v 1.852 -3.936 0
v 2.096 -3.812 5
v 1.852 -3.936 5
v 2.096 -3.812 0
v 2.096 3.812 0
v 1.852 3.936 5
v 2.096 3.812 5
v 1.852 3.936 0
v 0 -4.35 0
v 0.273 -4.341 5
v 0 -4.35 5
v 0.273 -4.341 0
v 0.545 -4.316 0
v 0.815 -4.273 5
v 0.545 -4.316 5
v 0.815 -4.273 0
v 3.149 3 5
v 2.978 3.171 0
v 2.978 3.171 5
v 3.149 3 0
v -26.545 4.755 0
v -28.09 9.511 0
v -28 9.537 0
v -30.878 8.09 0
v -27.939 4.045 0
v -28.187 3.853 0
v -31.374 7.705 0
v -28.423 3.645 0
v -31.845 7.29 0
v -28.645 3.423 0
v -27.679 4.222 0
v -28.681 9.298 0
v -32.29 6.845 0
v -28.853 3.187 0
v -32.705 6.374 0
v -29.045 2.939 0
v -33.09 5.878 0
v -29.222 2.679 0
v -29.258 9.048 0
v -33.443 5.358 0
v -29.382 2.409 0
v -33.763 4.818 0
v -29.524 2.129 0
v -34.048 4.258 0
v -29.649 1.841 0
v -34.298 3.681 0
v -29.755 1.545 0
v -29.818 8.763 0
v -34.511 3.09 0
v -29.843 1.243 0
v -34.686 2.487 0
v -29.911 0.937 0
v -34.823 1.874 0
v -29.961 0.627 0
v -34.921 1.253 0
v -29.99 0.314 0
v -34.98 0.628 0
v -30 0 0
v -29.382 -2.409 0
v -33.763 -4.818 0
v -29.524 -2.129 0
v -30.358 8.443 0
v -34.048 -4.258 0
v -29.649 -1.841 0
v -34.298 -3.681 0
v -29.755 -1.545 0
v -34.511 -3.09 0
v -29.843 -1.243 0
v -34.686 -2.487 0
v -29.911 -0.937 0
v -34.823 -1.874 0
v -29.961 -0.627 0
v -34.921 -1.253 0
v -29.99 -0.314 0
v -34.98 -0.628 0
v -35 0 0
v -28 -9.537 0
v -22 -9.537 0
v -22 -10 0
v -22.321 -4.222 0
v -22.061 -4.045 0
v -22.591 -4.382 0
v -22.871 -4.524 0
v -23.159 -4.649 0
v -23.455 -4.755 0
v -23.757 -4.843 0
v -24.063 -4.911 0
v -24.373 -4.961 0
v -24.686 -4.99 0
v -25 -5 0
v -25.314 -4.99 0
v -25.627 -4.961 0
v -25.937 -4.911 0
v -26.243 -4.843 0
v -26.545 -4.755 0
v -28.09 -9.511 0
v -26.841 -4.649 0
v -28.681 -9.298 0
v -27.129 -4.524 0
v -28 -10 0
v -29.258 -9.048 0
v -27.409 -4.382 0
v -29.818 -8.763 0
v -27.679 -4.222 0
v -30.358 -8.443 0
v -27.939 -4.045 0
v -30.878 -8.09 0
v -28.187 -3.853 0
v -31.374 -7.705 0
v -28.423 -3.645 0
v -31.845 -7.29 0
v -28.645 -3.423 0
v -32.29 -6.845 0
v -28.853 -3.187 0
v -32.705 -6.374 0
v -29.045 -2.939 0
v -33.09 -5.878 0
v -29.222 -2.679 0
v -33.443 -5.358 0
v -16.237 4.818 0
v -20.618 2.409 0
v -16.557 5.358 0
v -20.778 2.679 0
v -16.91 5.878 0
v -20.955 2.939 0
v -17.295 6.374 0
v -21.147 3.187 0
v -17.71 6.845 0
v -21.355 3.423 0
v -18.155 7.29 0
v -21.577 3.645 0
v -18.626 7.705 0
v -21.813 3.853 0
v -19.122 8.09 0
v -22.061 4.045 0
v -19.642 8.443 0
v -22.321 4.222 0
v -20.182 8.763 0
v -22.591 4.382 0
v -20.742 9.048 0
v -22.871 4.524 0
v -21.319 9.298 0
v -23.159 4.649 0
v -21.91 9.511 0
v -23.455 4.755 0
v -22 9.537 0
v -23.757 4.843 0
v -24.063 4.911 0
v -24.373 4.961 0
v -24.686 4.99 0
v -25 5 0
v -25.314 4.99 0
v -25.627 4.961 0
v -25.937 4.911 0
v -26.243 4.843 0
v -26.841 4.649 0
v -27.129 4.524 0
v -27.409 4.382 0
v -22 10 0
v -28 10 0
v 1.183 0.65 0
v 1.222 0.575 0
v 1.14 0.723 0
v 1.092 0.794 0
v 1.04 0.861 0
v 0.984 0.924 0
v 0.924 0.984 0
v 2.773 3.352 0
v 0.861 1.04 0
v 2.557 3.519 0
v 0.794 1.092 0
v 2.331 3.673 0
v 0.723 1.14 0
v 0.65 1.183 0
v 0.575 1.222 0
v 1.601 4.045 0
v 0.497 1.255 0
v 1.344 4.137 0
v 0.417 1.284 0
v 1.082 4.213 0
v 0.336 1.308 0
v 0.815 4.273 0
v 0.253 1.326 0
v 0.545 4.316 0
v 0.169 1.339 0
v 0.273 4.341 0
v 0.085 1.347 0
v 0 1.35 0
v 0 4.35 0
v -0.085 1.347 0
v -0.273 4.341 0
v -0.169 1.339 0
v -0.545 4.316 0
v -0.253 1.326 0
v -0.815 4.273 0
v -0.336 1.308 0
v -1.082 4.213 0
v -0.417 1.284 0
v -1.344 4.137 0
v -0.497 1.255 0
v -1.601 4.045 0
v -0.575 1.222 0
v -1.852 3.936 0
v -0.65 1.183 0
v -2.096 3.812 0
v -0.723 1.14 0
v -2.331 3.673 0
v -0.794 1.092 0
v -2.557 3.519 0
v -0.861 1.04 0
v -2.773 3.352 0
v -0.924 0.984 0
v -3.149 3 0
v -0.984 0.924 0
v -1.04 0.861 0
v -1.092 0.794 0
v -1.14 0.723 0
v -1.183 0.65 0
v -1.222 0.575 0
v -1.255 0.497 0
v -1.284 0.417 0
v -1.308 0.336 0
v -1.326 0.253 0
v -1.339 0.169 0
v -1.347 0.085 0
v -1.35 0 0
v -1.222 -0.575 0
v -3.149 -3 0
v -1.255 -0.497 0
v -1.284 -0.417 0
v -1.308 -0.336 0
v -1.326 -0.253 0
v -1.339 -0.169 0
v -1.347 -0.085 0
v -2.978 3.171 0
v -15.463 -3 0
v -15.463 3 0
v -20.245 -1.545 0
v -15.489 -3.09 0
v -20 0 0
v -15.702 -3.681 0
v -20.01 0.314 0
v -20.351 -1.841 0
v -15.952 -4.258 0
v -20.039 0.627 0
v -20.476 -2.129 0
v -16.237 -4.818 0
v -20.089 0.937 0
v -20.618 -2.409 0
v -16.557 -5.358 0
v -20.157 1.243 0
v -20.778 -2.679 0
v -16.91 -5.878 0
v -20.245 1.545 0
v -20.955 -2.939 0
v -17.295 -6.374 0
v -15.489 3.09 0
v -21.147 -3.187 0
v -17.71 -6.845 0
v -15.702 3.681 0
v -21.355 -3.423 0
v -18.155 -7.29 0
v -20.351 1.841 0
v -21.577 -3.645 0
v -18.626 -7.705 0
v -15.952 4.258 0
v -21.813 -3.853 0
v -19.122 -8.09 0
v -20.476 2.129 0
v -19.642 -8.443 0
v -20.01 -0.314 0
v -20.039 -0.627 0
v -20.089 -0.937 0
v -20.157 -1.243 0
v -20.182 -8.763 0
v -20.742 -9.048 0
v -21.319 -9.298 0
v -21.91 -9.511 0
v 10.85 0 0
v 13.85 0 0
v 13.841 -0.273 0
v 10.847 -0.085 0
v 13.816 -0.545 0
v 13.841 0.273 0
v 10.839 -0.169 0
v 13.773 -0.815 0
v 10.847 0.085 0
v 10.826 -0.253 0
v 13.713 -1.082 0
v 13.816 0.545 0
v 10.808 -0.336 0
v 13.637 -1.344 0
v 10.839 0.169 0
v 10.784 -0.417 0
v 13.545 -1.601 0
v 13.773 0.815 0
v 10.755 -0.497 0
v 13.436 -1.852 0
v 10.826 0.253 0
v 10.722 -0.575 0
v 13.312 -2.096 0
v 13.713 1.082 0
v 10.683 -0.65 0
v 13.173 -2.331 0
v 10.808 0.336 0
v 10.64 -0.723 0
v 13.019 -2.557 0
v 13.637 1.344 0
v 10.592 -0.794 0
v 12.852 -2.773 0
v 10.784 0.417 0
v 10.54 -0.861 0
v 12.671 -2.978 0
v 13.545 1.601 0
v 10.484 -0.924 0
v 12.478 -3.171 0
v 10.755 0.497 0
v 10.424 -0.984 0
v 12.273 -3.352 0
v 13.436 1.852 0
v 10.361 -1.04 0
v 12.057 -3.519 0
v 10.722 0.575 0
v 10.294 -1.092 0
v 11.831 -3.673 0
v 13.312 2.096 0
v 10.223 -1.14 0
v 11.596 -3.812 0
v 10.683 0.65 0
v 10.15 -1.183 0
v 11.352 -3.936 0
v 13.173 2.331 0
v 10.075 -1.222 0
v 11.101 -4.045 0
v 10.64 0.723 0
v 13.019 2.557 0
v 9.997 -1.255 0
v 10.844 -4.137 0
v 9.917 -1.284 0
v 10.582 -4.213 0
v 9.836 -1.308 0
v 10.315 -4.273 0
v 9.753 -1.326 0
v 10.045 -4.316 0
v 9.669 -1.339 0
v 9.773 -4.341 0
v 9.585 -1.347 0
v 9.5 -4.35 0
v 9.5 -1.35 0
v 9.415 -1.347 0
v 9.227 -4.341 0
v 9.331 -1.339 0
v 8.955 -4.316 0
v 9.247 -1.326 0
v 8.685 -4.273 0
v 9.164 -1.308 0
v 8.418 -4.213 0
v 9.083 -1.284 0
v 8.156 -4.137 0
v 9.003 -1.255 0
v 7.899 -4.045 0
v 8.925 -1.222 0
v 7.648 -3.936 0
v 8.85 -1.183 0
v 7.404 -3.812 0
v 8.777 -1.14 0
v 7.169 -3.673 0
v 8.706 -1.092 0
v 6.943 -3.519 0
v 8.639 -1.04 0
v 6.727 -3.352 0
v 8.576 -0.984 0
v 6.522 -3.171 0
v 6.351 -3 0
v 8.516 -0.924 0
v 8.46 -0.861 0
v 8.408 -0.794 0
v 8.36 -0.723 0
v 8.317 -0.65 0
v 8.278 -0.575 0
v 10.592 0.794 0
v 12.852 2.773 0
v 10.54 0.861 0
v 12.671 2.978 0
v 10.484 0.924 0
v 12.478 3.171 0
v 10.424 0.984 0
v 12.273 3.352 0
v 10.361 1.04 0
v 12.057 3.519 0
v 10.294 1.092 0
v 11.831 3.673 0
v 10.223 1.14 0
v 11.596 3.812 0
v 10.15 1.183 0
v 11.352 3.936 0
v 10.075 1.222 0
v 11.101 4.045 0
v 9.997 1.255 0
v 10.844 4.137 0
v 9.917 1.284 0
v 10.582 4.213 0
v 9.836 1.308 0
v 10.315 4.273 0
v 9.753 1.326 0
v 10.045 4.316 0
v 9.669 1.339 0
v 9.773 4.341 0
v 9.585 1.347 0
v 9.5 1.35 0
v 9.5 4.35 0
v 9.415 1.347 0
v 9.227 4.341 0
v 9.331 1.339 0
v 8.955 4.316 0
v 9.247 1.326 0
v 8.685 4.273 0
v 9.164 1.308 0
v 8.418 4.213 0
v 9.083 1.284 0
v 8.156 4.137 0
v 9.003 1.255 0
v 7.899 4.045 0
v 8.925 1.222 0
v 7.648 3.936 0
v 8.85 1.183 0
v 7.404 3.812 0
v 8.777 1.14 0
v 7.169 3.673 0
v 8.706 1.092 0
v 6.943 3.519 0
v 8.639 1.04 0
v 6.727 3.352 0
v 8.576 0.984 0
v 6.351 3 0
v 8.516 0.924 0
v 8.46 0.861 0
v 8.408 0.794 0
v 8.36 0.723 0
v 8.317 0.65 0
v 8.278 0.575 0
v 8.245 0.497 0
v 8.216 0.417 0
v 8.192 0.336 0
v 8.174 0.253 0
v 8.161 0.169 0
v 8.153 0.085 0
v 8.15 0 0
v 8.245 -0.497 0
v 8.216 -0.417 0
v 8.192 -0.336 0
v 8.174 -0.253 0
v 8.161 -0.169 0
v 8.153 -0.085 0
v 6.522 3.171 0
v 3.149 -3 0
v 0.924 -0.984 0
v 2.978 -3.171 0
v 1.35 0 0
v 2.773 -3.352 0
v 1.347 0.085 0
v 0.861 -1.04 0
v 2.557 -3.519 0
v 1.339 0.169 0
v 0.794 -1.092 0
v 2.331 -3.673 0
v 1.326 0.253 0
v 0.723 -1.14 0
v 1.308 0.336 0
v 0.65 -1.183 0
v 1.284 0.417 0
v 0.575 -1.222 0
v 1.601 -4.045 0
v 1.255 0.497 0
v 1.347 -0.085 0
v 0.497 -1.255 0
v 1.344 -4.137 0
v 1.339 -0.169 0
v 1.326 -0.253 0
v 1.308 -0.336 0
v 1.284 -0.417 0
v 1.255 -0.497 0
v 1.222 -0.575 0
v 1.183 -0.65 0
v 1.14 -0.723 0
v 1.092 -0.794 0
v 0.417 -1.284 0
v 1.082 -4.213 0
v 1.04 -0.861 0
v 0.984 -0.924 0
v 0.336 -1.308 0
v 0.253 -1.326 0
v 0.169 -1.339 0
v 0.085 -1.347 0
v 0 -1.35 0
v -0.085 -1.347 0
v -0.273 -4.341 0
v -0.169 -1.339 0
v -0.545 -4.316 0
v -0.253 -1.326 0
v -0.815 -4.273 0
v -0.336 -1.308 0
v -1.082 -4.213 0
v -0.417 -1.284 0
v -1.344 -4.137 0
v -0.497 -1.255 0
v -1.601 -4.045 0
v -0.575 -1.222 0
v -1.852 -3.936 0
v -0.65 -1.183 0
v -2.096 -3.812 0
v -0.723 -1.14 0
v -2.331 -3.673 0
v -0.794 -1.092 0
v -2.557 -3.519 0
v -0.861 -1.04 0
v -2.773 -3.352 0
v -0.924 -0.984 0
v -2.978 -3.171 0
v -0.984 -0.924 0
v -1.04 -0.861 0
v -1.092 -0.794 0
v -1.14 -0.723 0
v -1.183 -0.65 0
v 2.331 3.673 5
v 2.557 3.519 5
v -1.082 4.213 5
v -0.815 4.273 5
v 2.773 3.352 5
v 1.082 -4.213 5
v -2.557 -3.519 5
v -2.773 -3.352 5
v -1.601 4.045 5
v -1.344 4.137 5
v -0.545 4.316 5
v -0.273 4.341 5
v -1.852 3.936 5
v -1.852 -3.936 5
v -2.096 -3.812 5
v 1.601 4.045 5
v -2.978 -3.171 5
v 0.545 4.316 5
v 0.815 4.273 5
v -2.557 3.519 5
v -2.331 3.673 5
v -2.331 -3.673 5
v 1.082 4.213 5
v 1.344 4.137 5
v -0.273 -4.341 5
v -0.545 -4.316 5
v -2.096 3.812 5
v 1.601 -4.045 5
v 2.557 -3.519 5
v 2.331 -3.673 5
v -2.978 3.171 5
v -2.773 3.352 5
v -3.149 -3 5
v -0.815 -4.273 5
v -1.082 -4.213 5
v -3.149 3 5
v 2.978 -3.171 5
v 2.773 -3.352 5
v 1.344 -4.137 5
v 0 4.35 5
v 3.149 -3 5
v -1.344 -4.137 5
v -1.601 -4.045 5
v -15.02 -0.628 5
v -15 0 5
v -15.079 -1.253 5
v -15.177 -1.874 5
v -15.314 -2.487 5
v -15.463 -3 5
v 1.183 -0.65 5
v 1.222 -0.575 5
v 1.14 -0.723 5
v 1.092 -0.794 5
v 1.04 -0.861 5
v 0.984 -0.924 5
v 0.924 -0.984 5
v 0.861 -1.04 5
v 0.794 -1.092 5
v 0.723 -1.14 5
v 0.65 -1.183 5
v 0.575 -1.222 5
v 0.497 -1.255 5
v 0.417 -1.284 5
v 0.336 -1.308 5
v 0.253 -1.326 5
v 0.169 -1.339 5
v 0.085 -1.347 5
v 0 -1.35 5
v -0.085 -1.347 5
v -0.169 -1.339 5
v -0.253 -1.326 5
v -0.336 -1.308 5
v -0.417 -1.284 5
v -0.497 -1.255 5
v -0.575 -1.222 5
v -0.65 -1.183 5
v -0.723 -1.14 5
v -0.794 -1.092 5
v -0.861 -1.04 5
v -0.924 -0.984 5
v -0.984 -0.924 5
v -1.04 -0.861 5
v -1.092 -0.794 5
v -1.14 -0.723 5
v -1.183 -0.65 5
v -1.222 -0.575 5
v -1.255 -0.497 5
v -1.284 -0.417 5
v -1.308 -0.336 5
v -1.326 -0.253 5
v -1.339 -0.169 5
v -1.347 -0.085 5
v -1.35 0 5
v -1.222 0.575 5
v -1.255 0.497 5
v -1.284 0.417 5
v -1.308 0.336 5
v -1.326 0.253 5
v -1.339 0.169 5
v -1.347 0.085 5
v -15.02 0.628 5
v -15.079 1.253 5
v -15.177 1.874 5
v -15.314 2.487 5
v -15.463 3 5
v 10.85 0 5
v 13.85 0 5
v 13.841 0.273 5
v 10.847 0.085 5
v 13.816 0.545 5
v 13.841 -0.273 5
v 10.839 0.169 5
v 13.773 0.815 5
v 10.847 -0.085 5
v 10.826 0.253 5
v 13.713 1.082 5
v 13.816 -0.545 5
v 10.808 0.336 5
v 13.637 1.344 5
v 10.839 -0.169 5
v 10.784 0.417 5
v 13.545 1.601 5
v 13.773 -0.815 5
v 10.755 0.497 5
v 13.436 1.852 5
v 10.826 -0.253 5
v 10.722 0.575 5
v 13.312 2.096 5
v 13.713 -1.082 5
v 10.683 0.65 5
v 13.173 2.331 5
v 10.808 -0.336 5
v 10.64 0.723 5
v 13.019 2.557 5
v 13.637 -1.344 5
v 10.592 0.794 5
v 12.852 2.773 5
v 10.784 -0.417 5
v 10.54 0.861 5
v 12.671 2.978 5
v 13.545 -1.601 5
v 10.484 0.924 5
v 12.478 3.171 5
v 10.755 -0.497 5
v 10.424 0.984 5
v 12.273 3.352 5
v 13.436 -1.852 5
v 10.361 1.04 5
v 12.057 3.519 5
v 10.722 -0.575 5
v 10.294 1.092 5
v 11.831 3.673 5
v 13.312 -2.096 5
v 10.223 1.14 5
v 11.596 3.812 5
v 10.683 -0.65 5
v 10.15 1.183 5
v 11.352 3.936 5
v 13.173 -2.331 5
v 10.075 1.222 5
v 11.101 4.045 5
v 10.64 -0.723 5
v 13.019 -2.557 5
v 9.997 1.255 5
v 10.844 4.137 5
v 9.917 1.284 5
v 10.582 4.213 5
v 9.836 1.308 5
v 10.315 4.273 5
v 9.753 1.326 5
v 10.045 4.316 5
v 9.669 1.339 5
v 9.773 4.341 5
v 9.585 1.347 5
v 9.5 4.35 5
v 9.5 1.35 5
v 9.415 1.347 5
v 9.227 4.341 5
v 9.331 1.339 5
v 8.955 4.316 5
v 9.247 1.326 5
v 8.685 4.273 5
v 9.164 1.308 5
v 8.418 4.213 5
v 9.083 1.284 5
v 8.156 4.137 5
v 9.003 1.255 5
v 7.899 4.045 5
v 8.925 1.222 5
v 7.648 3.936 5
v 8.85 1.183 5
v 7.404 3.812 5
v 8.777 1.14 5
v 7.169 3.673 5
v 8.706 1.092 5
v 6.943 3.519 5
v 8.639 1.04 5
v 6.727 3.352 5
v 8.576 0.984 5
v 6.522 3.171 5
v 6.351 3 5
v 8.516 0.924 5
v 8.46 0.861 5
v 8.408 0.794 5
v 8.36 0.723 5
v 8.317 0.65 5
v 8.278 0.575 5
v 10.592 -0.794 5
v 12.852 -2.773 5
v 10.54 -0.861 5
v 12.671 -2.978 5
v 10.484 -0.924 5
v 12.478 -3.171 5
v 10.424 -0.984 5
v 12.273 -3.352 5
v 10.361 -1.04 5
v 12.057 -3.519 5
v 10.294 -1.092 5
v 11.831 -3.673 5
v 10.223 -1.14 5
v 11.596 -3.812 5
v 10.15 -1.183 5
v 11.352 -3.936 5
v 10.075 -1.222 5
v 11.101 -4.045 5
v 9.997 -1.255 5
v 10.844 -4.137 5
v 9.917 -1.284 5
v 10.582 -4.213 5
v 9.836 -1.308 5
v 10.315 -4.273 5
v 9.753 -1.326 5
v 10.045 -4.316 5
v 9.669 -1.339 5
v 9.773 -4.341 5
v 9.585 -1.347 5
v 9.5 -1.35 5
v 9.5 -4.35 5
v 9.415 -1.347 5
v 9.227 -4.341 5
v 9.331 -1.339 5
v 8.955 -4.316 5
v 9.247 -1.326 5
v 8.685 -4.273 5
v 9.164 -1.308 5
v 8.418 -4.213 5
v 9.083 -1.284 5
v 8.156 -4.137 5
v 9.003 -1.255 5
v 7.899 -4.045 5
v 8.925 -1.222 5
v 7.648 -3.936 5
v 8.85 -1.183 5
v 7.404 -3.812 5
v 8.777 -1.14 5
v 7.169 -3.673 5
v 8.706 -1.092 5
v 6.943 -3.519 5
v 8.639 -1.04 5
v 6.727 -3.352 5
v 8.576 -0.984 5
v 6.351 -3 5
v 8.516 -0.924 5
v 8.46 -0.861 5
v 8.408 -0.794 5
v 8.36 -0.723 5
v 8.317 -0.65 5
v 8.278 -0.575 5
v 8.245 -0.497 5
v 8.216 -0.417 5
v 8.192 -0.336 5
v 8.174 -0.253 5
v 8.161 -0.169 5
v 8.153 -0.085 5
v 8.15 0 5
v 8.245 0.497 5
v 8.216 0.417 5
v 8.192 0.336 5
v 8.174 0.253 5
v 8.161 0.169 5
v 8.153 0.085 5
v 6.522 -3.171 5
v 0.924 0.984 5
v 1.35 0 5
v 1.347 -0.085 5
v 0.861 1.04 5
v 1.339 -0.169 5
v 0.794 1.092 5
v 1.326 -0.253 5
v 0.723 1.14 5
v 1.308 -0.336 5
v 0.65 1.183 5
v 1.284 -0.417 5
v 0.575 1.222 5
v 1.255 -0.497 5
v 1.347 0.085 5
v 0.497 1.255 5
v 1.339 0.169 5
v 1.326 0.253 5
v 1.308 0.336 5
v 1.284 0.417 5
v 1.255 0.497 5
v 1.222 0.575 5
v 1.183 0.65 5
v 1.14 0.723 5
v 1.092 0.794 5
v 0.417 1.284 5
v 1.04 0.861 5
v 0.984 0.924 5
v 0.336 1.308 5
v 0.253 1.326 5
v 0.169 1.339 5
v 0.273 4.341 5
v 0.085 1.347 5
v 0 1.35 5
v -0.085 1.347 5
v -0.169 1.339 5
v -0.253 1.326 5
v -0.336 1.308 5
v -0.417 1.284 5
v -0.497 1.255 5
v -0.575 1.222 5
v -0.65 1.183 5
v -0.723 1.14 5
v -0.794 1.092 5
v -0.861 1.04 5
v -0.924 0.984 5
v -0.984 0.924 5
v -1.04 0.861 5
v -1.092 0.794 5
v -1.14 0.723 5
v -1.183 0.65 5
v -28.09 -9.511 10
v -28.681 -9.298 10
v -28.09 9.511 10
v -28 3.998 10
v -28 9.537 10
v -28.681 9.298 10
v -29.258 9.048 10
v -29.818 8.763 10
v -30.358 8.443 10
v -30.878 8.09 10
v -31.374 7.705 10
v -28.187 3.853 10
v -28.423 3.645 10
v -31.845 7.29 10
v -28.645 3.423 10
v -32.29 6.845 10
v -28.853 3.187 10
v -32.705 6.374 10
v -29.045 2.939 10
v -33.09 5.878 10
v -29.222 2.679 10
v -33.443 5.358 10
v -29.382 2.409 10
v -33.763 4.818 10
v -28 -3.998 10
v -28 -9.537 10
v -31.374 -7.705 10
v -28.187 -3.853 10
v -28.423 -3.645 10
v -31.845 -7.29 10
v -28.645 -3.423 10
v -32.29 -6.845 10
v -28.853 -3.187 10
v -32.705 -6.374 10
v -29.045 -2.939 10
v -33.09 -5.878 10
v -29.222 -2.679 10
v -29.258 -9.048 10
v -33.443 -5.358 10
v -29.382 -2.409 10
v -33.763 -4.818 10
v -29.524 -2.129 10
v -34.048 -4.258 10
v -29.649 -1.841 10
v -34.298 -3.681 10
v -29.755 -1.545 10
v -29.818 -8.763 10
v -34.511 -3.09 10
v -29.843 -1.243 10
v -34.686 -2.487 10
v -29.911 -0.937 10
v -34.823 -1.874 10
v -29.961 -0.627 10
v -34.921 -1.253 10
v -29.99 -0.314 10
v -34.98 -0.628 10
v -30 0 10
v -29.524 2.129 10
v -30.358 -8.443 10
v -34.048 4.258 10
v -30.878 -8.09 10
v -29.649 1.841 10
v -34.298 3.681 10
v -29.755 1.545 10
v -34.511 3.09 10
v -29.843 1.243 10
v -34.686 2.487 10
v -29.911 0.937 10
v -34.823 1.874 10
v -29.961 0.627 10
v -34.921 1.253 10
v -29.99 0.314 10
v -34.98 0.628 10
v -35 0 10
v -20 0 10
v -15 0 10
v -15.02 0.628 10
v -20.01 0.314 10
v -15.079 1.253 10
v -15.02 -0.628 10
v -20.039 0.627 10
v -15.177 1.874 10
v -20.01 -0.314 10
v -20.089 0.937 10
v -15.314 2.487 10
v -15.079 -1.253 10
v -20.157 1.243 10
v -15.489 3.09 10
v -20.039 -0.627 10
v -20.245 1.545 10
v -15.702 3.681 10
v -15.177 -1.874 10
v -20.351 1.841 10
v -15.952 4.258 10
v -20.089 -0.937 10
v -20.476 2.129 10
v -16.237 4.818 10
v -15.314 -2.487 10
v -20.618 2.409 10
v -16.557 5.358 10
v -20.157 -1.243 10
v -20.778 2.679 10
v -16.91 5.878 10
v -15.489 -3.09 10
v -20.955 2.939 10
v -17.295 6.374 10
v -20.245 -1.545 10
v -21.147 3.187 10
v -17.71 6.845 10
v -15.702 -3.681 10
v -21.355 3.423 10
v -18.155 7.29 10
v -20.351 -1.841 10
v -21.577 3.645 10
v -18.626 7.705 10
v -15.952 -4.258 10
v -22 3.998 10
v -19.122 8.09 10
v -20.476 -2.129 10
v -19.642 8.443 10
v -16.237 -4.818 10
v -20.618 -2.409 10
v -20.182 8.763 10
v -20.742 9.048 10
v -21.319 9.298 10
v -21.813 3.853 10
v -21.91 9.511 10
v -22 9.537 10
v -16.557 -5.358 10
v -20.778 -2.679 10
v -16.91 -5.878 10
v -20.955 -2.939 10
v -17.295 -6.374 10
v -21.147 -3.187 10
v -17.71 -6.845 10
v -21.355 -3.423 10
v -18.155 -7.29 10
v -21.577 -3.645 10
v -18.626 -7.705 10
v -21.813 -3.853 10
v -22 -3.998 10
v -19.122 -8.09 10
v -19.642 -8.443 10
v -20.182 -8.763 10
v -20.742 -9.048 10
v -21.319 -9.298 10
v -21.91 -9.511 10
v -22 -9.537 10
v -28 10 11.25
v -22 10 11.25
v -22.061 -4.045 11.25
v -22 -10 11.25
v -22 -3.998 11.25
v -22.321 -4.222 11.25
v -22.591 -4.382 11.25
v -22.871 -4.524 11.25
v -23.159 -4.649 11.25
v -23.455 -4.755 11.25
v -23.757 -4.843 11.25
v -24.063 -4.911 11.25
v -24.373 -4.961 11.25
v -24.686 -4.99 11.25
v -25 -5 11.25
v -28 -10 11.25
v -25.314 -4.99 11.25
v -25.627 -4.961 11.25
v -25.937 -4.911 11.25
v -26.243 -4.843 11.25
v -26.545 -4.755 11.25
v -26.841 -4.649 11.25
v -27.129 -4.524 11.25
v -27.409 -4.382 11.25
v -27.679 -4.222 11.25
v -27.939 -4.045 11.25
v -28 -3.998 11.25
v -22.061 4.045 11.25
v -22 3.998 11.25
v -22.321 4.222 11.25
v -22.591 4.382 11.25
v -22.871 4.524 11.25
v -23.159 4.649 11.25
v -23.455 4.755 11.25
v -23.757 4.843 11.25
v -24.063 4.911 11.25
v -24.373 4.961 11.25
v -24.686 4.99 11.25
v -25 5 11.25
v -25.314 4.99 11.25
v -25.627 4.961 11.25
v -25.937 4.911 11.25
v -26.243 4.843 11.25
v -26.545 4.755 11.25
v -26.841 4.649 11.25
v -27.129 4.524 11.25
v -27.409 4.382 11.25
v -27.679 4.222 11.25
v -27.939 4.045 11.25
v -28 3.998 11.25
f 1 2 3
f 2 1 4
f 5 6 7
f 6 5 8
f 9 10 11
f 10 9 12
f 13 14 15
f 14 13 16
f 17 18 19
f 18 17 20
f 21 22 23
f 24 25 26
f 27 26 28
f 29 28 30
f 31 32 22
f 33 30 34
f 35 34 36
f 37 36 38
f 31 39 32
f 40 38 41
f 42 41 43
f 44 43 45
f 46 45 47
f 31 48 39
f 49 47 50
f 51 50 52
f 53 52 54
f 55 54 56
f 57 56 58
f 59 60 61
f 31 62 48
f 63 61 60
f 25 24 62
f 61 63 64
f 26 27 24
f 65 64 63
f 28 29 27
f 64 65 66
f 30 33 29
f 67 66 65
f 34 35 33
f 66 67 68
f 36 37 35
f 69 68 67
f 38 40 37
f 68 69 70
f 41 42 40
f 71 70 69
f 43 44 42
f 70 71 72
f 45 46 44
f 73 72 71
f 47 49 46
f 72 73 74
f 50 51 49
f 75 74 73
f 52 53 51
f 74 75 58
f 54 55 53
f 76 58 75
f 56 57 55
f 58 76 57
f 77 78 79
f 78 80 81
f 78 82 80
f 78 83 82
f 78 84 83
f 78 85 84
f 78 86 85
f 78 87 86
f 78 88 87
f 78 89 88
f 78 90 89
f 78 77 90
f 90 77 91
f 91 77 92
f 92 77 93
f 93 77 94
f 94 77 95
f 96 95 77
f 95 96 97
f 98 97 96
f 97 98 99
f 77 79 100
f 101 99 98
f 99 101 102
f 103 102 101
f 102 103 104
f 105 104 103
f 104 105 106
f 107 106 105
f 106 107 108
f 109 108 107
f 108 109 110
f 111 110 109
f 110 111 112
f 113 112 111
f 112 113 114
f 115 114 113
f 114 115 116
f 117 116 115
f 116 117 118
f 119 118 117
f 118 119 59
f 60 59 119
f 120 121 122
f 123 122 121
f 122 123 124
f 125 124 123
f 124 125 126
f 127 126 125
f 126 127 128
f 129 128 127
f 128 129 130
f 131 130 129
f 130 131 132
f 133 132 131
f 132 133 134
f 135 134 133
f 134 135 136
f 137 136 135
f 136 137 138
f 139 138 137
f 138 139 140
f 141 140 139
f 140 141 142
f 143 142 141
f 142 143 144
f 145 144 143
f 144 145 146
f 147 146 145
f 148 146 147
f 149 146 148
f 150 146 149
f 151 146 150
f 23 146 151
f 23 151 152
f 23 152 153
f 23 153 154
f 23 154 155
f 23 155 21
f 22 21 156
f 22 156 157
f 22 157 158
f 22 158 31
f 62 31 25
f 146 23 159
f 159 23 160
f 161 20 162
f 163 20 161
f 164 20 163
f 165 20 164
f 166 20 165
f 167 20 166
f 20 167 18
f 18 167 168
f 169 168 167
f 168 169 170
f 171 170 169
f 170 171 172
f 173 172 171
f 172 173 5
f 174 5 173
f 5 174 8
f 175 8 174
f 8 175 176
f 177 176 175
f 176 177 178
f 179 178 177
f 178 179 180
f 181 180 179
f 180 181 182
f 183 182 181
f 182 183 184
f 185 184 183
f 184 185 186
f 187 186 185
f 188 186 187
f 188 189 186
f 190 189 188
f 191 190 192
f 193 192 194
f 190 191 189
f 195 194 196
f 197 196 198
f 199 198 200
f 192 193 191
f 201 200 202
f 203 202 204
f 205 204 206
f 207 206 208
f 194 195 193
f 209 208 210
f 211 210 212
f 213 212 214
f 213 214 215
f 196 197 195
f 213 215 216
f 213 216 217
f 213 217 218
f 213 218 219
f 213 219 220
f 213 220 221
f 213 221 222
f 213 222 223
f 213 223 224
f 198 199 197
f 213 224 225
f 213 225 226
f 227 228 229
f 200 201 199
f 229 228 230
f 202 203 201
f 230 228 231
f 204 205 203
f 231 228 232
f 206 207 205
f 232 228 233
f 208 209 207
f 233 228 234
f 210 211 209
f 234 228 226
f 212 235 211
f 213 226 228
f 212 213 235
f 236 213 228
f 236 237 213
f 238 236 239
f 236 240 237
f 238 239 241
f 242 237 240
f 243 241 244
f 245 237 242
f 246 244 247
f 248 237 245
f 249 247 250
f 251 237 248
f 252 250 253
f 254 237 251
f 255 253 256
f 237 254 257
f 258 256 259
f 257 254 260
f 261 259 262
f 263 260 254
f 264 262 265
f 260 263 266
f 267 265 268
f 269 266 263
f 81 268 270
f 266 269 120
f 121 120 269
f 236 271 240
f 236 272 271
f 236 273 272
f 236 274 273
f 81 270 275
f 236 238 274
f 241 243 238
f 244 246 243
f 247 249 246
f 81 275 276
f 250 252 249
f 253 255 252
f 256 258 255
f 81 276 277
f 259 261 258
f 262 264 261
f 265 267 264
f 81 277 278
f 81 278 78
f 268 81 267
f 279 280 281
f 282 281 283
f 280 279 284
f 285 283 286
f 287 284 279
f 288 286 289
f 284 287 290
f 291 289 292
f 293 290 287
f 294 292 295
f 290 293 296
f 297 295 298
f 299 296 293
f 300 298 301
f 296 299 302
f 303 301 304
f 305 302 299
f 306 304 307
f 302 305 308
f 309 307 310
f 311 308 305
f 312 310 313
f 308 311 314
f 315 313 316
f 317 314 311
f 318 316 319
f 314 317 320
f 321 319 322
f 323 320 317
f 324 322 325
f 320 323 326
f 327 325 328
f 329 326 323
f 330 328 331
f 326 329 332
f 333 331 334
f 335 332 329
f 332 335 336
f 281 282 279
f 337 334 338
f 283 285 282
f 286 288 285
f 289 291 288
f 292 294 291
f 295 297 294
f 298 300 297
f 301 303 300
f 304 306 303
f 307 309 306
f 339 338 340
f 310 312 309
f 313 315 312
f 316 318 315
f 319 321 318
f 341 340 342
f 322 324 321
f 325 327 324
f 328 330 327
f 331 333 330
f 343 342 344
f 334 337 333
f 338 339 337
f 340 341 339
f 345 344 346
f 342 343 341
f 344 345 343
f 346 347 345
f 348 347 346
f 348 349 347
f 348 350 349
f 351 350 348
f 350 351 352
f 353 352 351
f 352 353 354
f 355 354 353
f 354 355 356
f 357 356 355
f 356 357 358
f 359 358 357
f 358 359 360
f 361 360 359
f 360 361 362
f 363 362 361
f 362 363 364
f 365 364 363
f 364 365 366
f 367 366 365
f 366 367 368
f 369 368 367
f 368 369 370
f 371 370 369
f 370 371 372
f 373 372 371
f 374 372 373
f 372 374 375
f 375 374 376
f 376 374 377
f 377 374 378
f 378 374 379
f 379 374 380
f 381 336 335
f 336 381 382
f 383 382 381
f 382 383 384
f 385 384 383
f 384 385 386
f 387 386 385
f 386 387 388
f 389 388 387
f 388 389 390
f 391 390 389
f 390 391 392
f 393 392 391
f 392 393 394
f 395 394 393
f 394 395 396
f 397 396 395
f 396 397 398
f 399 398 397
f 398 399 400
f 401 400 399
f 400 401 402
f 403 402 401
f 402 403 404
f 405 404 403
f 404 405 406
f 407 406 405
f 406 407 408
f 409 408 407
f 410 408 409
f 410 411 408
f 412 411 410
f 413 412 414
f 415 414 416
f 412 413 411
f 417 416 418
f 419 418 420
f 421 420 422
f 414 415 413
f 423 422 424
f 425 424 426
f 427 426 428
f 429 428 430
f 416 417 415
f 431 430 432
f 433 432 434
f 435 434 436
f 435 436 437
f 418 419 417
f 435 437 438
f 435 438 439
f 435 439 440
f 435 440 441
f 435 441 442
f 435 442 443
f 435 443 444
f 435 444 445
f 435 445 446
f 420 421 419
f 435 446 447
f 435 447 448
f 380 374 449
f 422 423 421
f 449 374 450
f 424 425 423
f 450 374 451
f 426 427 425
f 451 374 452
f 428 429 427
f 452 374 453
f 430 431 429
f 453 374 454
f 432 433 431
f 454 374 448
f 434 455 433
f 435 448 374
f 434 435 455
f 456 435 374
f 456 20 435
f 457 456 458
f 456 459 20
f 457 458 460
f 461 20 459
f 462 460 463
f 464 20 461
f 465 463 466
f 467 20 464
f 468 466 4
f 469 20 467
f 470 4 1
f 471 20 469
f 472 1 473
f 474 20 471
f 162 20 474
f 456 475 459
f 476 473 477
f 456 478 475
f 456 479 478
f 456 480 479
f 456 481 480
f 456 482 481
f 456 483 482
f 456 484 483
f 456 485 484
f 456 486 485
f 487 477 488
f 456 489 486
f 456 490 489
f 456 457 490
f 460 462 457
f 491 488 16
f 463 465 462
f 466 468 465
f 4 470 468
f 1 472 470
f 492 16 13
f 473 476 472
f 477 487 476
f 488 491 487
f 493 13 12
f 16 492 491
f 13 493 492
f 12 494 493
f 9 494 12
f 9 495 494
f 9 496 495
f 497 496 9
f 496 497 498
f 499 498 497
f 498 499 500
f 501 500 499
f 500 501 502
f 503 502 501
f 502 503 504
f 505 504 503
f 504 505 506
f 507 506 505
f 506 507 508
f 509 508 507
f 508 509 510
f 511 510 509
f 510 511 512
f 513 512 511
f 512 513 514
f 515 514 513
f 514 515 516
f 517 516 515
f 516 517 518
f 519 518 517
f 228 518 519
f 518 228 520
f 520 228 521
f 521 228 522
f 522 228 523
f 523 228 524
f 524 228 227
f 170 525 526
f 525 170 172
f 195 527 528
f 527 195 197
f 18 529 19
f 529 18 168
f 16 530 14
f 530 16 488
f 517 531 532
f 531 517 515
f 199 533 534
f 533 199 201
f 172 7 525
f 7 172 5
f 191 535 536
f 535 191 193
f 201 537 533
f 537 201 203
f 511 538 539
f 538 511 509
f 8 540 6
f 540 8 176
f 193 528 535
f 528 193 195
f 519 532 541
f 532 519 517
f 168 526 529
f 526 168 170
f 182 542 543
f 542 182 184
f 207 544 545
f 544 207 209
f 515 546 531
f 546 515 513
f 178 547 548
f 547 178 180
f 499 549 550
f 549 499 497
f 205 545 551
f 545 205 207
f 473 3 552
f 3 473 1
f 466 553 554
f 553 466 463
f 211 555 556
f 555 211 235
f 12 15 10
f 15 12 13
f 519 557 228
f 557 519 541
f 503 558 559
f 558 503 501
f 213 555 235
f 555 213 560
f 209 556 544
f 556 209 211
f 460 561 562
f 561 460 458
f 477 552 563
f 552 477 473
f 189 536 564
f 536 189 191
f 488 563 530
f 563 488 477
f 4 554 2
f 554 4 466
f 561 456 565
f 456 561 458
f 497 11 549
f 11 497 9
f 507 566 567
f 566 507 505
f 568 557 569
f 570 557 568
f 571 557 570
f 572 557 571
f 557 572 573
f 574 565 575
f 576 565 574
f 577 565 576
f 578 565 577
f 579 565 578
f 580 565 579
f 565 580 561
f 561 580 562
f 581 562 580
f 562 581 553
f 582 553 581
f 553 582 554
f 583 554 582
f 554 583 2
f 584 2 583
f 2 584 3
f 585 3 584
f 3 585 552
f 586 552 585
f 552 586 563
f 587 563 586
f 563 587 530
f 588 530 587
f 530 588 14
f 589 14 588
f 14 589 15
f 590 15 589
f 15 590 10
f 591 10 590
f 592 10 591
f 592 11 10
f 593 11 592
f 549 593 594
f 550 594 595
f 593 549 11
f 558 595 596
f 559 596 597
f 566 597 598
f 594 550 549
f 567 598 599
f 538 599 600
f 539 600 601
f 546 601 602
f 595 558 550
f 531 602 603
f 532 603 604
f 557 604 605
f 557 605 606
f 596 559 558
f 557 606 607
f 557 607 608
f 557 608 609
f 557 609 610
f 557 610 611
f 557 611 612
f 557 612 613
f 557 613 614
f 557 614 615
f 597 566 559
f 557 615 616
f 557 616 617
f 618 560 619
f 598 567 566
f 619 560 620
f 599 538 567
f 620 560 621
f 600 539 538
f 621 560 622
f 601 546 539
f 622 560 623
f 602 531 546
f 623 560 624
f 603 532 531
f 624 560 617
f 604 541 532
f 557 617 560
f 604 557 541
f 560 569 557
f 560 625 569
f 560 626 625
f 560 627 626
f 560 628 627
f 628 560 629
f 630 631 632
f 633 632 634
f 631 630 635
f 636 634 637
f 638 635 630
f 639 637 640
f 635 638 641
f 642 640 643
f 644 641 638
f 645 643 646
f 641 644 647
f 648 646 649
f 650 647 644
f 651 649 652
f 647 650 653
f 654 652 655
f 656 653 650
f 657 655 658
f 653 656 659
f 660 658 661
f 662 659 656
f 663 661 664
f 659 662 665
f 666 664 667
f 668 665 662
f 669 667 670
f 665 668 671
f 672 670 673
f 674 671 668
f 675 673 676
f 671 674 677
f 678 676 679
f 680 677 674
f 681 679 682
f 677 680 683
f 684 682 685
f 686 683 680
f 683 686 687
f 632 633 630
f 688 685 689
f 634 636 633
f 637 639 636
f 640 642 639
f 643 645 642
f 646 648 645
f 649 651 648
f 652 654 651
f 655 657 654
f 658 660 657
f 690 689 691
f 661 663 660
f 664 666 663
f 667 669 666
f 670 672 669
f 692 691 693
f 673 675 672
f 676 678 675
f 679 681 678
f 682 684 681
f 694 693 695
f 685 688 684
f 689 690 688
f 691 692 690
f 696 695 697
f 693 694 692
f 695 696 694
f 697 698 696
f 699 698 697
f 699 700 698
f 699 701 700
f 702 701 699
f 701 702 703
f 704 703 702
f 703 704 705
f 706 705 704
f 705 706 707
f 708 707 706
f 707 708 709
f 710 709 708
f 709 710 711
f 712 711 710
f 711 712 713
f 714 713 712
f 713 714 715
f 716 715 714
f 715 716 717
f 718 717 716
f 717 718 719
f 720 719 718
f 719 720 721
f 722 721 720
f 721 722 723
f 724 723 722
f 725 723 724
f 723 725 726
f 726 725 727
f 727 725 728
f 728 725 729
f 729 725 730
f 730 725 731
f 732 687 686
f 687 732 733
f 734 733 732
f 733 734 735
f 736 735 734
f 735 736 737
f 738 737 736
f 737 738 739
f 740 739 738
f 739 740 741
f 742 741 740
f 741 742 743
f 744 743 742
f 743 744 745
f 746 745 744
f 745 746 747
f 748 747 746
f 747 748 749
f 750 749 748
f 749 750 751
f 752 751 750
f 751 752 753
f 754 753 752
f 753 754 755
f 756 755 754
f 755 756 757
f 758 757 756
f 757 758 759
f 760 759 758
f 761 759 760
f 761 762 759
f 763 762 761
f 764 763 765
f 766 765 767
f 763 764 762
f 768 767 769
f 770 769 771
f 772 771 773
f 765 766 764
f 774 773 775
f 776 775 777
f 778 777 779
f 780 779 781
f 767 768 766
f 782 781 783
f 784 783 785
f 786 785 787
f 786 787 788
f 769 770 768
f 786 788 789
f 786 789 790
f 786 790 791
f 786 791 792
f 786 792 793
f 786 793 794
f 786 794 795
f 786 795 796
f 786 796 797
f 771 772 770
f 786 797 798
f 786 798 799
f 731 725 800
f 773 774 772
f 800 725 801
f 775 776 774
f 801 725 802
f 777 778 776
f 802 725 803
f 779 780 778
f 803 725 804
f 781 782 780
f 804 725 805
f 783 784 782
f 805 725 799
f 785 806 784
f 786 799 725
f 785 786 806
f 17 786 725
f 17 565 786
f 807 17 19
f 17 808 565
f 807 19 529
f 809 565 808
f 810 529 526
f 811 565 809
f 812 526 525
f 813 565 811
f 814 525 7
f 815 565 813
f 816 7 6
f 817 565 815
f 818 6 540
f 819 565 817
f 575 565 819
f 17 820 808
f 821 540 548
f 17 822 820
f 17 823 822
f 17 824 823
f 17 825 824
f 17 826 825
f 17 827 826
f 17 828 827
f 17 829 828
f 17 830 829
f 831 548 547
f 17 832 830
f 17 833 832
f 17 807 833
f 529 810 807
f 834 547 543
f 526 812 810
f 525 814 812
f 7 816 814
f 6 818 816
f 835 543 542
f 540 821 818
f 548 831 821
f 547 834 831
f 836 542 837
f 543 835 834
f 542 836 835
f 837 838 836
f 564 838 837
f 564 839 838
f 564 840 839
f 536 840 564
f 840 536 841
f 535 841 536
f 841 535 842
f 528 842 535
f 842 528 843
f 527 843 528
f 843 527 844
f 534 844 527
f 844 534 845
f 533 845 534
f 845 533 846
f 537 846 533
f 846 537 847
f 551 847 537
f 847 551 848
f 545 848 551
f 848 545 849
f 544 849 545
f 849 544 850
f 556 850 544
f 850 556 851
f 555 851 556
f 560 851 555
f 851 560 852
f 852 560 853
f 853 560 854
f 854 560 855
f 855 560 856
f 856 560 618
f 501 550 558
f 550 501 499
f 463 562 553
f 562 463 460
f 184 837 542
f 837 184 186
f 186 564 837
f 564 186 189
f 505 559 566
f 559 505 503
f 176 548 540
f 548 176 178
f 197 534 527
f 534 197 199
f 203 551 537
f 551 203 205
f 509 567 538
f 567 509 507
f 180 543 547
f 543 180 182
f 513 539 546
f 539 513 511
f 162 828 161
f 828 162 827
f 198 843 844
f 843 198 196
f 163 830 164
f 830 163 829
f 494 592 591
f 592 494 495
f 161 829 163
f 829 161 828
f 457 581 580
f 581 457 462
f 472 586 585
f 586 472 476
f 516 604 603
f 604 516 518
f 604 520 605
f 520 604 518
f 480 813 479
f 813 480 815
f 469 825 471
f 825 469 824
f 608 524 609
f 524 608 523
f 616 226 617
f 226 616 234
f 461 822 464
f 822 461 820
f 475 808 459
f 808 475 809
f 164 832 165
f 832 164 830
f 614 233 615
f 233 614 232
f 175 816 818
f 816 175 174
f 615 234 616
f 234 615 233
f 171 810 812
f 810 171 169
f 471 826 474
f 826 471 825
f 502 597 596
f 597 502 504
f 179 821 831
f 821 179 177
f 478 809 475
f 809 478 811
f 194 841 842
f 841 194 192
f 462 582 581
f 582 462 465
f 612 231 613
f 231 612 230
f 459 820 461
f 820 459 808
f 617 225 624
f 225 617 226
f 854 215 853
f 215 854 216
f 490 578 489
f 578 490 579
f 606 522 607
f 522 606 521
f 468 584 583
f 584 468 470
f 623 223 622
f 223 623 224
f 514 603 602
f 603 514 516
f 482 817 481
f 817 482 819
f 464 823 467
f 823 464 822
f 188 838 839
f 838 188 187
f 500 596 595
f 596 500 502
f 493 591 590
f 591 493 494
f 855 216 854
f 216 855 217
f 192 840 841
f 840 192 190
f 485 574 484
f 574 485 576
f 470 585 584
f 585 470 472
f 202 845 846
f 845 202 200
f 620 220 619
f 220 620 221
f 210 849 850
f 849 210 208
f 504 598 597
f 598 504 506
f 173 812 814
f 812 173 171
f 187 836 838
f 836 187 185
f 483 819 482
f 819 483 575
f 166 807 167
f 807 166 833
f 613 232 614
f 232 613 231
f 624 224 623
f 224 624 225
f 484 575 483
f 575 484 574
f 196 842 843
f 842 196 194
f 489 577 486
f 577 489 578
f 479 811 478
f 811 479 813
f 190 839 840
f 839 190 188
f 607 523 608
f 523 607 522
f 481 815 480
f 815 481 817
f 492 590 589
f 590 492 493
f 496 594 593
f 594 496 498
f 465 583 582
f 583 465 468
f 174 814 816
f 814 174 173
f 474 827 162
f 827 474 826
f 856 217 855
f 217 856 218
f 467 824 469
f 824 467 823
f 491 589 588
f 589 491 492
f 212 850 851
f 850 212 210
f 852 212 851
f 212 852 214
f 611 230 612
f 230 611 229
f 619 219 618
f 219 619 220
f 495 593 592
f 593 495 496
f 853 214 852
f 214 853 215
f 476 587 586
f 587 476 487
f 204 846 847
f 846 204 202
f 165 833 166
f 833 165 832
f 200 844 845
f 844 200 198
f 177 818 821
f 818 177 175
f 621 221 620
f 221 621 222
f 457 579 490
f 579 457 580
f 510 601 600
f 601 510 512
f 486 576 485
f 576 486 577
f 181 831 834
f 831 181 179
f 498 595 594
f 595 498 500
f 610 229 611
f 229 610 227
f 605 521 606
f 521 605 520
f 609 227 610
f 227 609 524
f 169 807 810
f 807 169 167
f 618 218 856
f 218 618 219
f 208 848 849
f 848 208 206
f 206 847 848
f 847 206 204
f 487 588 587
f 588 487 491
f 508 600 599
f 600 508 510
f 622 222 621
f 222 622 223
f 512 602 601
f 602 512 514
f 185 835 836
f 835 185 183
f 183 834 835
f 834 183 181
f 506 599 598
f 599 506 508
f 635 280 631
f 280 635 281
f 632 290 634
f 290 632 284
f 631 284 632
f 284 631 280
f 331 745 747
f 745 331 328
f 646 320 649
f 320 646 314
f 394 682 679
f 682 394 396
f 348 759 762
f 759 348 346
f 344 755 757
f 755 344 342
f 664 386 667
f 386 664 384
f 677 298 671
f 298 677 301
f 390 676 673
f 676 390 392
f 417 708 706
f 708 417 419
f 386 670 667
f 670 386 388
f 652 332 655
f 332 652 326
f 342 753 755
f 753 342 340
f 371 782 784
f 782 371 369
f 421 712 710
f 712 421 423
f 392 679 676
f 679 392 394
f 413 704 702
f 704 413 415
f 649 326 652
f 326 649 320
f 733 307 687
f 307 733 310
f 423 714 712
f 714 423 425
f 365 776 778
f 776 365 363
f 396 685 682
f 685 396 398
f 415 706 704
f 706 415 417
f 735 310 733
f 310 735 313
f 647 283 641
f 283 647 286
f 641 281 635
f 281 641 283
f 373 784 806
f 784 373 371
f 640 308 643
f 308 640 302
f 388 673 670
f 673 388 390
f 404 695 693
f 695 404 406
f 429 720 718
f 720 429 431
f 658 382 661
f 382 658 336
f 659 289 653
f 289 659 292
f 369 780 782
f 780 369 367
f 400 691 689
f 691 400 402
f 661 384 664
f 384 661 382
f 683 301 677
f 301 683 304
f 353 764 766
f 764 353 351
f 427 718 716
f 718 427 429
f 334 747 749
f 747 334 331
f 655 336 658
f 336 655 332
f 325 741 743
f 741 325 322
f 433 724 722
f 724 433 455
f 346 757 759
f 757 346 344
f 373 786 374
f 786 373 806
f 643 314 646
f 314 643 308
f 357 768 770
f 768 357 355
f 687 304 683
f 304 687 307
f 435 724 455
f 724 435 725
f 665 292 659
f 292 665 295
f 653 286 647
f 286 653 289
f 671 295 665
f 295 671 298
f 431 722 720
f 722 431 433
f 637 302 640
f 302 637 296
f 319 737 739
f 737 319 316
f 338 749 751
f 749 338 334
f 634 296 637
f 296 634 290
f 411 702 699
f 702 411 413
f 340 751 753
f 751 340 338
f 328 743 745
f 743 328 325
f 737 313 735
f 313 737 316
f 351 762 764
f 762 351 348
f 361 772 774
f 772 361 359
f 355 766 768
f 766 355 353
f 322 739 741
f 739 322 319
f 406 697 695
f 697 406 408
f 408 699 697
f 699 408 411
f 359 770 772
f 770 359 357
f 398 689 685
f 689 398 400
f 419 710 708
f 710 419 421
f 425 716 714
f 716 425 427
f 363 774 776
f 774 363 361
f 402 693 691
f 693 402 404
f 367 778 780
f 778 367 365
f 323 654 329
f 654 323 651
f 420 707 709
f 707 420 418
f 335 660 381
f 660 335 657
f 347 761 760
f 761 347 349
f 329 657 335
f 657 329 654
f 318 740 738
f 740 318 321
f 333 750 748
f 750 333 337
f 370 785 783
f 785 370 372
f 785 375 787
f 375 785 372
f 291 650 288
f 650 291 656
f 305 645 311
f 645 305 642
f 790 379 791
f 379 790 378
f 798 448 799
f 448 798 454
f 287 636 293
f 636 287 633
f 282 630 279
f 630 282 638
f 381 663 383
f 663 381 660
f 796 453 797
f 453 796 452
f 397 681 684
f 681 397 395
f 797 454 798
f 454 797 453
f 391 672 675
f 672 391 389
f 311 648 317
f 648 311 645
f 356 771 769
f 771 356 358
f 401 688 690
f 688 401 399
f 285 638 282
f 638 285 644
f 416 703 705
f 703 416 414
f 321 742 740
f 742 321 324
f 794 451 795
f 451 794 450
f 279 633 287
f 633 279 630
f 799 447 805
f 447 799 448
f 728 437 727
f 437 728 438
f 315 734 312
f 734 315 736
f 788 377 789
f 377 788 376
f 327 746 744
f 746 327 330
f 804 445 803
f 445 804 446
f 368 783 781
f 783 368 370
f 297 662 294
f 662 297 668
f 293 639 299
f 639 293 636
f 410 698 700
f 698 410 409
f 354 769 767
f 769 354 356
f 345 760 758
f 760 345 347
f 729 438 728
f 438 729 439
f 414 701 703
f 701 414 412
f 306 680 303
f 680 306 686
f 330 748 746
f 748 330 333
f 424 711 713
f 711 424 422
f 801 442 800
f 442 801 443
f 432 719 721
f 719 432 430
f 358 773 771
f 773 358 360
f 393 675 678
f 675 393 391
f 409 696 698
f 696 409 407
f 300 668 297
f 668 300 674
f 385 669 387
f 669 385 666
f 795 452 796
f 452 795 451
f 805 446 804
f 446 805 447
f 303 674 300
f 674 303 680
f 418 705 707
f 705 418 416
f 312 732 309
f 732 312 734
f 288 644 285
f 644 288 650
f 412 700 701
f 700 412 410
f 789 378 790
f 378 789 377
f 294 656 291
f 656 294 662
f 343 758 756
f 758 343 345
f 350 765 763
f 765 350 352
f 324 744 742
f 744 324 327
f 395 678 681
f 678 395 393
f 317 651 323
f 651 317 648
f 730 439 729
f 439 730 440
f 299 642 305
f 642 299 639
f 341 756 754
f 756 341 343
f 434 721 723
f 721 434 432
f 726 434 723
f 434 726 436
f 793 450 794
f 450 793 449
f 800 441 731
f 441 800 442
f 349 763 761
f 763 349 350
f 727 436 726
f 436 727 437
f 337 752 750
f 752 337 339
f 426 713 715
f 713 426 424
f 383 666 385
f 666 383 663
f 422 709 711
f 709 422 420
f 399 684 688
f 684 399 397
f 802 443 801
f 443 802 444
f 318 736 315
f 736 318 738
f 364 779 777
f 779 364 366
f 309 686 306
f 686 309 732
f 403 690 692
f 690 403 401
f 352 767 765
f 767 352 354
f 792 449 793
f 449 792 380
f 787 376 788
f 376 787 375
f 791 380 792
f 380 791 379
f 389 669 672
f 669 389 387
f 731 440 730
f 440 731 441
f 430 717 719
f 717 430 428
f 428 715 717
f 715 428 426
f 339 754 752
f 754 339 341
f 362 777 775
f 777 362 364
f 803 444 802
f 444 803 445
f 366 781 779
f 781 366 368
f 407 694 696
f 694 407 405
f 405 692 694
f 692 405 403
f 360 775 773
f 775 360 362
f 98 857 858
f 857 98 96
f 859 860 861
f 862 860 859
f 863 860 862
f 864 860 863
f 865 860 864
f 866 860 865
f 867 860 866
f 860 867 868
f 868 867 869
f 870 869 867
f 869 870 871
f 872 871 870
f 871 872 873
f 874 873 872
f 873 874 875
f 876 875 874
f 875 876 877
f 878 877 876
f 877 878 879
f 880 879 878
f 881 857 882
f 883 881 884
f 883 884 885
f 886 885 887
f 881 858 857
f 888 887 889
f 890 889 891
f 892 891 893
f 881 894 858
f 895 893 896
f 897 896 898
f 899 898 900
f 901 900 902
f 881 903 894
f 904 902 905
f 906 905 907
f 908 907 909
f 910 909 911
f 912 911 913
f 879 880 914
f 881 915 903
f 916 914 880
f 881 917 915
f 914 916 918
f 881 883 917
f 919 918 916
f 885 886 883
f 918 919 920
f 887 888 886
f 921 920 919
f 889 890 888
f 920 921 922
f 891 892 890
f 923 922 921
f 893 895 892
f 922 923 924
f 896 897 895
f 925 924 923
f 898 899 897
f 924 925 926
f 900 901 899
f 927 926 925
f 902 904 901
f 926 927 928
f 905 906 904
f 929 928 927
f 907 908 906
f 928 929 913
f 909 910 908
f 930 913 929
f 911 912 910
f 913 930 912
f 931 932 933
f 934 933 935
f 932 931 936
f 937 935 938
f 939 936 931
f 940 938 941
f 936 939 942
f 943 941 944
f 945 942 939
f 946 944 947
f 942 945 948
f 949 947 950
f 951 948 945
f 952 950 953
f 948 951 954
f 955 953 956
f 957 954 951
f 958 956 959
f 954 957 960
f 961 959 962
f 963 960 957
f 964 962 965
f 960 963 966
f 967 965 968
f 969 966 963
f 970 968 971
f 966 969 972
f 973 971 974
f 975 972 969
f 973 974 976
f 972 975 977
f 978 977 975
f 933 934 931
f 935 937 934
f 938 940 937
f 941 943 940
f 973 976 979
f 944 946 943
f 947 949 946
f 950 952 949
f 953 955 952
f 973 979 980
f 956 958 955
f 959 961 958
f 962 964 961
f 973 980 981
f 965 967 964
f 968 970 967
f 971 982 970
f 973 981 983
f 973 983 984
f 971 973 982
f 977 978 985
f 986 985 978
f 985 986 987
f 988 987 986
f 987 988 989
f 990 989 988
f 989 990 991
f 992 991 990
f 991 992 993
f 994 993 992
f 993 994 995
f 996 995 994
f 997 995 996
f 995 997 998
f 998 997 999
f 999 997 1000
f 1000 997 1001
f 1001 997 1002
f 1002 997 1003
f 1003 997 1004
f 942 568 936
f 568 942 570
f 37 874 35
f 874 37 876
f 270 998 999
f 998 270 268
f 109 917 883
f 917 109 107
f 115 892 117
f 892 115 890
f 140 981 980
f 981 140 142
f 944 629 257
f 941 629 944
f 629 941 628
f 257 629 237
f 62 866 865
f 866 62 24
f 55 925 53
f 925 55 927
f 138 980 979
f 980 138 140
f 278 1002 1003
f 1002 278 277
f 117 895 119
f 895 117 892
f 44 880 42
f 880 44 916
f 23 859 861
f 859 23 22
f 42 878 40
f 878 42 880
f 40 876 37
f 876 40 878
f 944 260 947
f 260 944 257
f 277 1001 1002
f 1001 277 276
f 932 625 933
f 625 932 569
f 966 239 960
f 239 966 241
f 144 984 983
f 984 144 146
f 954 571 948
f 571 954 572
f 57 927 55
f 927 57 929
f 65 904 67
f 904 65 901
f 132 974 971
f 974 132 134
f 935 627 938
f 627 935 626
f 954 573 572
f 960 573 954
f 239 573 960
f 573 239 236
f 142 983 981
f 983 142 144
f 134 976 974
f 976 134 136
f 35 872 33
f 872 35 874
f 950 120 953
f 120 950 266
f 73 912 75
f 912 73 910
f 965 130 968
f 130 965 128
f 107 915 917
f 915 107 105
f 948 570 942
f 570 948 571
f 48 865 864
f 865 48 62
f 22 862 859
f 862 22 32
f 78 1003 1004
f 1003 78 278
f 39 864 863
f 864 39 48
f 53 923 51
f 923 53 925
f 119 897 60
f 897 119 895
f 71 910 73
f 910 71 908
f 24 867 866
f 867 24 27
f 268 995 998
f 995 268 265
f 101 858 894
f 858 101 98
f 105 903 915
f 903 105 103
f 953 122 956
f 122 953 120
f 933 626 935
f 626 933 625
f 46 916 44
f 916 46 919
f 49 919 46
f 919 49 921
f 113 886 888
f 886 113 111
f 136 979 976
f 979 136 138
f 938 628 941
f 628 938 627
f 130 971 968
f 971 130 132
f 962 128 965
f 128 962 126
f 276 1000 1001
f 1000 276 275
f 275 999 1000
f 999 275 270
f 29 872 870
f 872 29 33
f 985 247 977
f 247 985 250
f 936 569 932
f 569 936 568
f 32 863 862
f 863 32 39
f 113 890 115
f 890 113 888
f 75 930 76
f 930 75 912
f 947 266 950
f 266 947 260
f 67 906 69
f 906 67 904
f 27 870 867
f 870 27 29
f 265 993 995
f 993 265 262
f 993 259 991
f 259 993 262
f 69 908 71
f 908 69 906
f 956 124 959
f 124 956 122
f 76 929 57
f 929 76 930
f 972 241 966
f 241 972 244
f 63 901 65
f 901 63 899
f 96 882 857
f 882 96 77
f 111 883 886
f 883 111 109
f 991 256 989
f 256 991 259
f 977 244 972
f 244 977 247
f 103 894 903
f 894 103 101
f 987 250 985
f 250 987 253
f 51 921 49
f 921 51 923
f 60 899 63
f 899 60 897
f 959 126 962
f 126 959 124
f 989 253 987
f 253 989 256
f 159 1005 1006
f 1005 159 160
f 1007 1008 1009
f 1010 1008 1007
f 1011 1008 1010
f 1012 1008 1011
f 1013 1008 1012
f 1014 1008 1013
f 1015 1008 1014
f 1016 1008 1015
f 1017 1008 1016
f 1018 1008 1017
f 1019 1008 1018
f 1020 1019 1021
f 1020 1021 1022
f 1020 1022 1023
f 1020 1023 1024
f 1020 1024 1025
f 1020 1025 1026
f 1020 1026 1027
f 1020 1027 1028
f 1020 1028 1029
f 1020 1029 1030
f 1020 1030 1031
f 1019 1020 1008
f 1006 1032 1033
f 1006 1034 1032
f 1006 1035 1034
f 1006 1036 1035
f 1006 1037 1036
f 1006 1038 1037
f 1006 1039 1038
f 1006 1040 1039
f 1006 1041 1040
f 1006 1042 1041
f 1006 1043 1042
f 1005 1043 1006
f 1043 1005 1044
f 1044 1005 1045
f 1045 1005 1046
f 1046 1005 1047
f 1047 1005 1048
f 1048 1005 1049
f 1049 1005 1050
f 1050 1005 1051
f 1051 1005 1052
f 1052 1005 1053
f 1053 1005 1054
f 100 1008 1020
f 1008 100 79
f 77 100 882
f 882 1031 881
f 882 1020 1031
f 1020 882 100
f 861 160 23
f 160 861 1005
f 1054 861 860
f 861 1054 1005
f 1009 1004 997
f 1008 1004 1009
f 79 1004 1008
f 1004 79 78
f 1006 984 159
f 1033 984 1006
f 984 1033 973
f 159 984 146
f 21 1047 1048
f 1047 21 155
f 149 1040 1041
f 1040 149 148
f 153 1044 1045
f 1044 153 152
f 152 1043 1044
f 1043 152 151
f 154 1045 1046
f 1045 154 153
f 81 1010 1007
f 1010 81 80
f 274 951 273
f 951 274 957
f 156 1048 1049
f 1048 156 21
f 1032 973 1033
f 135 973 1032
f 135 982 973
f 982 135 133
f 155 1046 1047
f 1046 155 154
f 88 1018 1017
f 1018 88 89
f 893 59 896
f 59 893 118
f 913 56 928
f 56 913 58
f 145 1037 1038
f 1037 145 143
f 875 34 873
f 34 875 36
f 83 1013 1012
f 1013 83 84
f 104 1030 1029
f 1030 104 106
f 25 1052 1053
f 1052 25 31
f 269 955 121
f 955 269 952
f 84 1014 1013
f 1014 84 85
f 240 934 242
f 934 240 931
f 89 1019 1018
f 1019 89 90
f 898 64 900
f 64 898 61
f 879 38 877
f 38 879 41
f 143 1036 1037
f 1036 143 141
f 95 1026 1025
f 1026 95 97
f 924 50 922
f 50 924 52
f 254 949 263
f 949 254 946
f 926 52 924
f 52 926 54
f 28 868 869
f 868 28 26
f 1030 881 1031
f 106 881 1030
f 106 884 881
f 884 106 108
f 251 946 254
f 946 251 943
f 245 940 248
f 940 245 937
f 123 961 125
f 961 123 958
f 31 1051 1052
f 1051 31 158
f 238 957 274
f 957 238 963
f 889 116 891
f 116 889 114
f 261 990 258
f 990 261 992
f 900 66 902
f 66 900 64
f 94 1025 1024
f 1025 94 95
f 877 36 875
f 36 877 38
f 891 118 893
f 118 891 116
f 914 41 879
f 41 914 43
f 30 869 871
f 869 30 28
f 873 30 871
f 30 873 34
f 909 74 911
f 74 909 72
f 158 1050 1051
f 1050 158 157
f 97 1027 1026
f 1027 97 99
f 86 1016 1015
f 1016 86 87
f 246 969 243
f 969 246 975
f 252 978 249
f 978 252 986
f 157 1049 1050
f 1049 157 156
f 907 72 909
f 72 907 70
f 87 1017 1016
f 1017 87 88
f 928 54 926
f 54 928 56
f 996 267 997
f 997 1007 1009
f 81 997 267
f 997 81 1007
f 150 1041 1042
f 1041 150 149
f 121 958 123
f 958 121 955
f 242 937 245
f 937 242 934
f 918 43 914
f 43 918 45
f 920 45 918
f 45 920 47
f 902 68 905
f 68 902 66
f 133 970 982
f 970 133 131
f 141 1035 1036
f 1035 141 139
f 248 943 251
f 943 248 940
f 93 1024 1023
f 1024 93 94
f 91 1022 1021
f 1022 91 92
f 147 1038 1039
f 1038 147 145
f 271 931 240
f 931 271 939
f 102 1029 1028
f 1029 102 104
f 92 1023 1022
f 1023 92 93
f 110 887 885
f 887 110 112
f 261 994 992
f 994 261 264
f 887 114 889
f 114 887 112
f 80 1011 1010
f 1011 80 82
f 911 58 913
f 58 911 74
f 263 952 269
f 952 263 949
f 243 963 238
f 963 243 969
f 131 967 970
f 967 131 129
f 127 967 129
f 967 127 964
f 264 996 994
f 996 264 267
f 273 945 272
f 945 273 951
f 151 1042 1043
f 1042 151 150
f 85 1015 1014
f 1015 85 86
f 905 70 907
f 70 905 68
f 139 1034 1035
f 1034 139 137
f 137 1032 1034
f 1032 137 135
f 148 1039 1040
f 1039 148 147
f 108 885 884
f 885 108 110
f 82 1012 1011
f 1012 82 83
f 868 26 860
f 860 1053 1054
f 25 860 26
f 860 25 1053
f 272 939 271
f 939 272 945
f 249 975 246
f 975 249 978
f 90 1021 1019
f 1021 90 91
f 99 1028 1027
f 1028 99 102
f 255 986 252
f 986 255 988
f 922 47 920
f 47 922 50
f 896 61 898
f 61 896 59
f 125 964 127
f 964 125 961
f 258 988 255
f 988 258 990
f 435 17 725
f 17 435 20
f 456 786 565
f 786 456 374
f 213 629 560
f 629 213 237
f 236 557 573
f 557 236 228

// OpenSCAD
// file: LUKENlib.scad
//####Corte eje motor BYJ###

module BYJshaft(tol=1){
            altura=3;
            difference(){
            circle(d=4.95+tol);
            translate([-5,(altura+tol)/2])
                square([10,10]);
                
            translate([-5,-10-(altura+tol)/2])
                square([10,10]);
                }
        }
        
        
   
//#####MOTOR BYJ#####

//corteBYJ(centerShaft=1);

module corteBYJ(centerShaft=1){

    //motor a pasos BYJ
    diamMotor=28;
    distTorMotor=35.4;
    diamTorMotor=3.8;
    tol=1;
    distCenterToShaft=6.5;
    dimCortCuad=18;
         if(centerShaft==1){
            translate([0,distCenterToShaft])
                 union(){
                    circle(d=diamMotor+tol);         //motor
                    square([dimCortCuad+(tol),(dimCortCuad*2)+tol],center=true);      //base
                    square([6+(2*tol),(20*2)+(2*tol)],center=true);      //cables
                    
                    
                    //tronillo motor 1
                    translate([distTorMotor/2,0])
                    circle(d=diamTorMotor+tol);
                    
                    //tronillo motor 2
                    translate([-distTorMotor/2,0])
                    circle(d=diamTorMotor+tol);
                }
            }
            
                     if(centerShaft==0){
          
                 union(){
                    circle(d=diamMotor+tol);         //motor
                    square([17+(tol),(17*2)+tol],center=true);      //base
                    square([6+(2*tol),(19*2)+(2*tol)],center=true);      //cables
                    
                    
                    //tronillo motor 1
                    translate([distTorMotor/2,0])
                    circle(d=diamTorMotor+tol);
                    
                    //tronillo motor 2
                    translate([-distTorMotor/2,0])
                    circle(d=diamTorMotor+tol);
                }
            }
            
        }


//#####POSTE####
   module Poste(altura=10,espesor=3,tol=1,diamShaft=2){
	   
	   difference(){
	      cylinder(d=(espesor*2)+diamShaft+tol,h=altura);
	   
		  cylinder(d=diamShaft+tol,h=altura*4,center=true);
	      
	   }
   }

//#####APOYOS PERFILES#####
module apoyoBase(
diametro=20,
tornillo=4,
tol=1,
altura=10,
altura1=1.25,
anchoCubo=6
){
    difference(){
        union(){
          cylinder(d=diametro,h=altura);
          translate([-diametro/2,-anchoCubo/2,0])
          cube([diametro,anchoCubo,altura+altura1]);
        }
        cylinder(d=tornillo+(tol*2),h=diametro*2,center=true);
    }
}
// main file
use <LUKENlib.scad>







//#####RENDERIZADO#####

/*
apoyoBase(
diametro=20,
tornillo=4,
tol=1,
altura=10,
altura1=1.25
);
*/


$fn=100;



diamShaft=1.7;
distPost=9.5;
//distSwPr=16;
distSwPr=25;


espesor=3;
tornillo=4;
tol=1;


//union apoyos fin de carrera
translate([espesor,-espesor,0])
cube([espesor*1.2,espesor*2,5]);

//union con apoyo de perfil
translate([-distSwPr+(espesor*2),-espesor,0])
cube([distSwPr-(espesor*3),espesor*2,5]);

//poste tornillo
for(i=[0,1]){
    translate([distPost*i,0])
    Poste(altura=5,espesor=espesor,tol=1,diamShaft=diamShaft);
}


//poste perfil
translate([-distSwPr,0,0])

rotate(90)
 apoyoBase(
//diametro=14,
diametro=20,
//tornillo=tornillo,
tornillo=8,
tol=tol,
altura=10,
altura1=1.25,
anchoCubo=6
);


//Poste(altura=10,espesor=espesor,tol=tol,diamShaft=tornillo+(tol*2));
